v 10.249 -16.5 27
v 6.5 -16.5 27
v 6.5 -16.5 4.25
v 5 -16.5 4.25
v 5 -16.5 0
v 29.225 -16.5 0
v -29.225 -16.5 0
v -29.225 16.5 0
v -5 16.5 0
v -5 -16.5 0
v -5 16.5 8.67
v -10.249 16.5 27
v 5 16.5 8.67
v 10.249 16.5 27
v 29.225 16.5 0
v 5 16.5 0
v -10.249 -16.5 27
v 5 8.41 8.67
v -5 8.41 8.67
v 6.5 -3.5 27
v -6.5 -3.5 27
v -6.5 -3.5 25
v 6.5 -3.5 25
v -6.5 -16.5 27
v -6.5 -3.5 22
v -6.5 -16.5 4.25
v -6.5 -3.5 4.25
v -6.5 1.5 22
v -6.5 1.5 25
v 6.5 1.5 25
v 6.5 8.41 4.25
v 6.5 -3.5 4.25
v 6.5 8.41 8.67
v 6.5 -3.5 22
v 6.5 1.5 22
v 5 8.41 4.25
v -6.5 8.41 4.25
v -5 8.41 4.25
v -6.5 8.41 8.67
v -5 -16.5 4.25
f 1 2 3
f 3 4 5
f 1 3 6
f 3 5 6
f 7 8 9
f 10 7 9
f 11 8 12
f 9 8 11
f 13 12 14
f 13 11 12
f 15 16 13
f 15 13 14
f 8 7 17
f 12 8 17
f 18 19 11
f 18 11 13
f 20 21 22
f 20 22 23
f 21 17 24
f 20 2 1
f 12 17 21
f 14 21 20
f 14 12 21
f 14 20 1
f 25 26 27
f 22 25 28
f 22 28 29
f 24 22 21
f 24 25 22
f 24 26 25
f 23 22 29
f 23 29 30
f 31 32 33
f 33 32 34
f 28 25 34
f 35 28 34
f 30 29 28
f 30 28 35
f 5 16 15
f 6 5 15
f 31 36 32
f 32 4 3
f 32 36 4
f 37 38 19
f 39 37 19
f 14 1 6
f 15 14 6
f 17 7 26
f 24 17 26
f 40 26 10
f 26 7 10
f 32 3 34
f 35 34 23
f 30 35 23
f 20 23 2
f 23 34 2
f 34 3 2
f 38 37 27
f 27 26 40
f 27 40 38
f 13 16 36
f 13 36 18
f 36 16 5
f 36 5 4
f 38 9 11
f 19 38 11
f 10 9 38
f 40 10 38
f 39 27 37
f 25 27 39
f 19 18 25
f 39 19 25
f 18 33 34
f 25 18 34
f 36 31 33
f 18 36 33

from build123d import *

# Parameters (mm, degrees)
F0_W      = 58.45
F0_H      = 33
F1_DEPTH  = 27
F3_DEPTH  = 33.001
F4_W      = 10
F4_H      = 8.67
F5_DEPTH  = 33.001
F6_W      = 13
F6_H      = 22.75
F7_DEPTH  = 13
F8_W      = 13
F8_H      = 3
F9_DEPTH  = 5
F11_DEPTH = 6.5


with BuildPart() as f1:
    # F0 (on Top) → F1 (new body)
    with BuildSketch(Plane.XY):
        Rectangle(F0_W, F0_H)
    extrude(amount=F1_DEPTH)

    # F2 (on face) → F3 (cut, through all)
    with BuildSketch(Plane.XZ.offset(16.5)):
        Polygon((-29.225, 27), (-29.225, 0), (-10.249082, 27), align=None)
        Polygon((10.249082, 27), (29.225, 0), (29.225, 27), align=None)
    extrude(amount=-F3_DEPTH, mode=Mode.SUBTRACT)

    # F4 (on face) → F5 (cut, through all)
    with BuildSketch(Plane.XZ.offset(16.5)):
        with Locations((0, 4.335)):
            Rectangle(F4_W, F4_H)
    extrude(amount=-F5_DEPTH, mode=Mode.SUBTRACT)

    # F6 (on face) → F7 (cut)
    with BuildSketch(Plane.XZ.offset(16.5)):
        with Locations((0.000217, 15.625)):
            Rectangle(F6_W, F6_H)
    extrude(amount=-F7_DEPTH, mode=Mode.SUBTRACT)

    # F8 (on face) → F9 (cut)
    with BuildSketch(Plane.XZ.offset(3.5)):
        with Locations((0.000217, 23.5)):
            Rectangle(F8_W, F8_H)
    extrude(amount=-F9_DEPTH, mode=Mode.SUBTRACT)

    # F10 (on Right) → F11 (cut, symmetric)
    with BuildSketch(Plane.YZ):
        Polygon((8.41, 8.67), (-3.5, 22), (-3.5, 4.25), (8.41, 4.25), align=None)
    extrude(amount=F11_DEPTH, both=True, mode=Mode.SUBTRACT)


solid = f1.part
